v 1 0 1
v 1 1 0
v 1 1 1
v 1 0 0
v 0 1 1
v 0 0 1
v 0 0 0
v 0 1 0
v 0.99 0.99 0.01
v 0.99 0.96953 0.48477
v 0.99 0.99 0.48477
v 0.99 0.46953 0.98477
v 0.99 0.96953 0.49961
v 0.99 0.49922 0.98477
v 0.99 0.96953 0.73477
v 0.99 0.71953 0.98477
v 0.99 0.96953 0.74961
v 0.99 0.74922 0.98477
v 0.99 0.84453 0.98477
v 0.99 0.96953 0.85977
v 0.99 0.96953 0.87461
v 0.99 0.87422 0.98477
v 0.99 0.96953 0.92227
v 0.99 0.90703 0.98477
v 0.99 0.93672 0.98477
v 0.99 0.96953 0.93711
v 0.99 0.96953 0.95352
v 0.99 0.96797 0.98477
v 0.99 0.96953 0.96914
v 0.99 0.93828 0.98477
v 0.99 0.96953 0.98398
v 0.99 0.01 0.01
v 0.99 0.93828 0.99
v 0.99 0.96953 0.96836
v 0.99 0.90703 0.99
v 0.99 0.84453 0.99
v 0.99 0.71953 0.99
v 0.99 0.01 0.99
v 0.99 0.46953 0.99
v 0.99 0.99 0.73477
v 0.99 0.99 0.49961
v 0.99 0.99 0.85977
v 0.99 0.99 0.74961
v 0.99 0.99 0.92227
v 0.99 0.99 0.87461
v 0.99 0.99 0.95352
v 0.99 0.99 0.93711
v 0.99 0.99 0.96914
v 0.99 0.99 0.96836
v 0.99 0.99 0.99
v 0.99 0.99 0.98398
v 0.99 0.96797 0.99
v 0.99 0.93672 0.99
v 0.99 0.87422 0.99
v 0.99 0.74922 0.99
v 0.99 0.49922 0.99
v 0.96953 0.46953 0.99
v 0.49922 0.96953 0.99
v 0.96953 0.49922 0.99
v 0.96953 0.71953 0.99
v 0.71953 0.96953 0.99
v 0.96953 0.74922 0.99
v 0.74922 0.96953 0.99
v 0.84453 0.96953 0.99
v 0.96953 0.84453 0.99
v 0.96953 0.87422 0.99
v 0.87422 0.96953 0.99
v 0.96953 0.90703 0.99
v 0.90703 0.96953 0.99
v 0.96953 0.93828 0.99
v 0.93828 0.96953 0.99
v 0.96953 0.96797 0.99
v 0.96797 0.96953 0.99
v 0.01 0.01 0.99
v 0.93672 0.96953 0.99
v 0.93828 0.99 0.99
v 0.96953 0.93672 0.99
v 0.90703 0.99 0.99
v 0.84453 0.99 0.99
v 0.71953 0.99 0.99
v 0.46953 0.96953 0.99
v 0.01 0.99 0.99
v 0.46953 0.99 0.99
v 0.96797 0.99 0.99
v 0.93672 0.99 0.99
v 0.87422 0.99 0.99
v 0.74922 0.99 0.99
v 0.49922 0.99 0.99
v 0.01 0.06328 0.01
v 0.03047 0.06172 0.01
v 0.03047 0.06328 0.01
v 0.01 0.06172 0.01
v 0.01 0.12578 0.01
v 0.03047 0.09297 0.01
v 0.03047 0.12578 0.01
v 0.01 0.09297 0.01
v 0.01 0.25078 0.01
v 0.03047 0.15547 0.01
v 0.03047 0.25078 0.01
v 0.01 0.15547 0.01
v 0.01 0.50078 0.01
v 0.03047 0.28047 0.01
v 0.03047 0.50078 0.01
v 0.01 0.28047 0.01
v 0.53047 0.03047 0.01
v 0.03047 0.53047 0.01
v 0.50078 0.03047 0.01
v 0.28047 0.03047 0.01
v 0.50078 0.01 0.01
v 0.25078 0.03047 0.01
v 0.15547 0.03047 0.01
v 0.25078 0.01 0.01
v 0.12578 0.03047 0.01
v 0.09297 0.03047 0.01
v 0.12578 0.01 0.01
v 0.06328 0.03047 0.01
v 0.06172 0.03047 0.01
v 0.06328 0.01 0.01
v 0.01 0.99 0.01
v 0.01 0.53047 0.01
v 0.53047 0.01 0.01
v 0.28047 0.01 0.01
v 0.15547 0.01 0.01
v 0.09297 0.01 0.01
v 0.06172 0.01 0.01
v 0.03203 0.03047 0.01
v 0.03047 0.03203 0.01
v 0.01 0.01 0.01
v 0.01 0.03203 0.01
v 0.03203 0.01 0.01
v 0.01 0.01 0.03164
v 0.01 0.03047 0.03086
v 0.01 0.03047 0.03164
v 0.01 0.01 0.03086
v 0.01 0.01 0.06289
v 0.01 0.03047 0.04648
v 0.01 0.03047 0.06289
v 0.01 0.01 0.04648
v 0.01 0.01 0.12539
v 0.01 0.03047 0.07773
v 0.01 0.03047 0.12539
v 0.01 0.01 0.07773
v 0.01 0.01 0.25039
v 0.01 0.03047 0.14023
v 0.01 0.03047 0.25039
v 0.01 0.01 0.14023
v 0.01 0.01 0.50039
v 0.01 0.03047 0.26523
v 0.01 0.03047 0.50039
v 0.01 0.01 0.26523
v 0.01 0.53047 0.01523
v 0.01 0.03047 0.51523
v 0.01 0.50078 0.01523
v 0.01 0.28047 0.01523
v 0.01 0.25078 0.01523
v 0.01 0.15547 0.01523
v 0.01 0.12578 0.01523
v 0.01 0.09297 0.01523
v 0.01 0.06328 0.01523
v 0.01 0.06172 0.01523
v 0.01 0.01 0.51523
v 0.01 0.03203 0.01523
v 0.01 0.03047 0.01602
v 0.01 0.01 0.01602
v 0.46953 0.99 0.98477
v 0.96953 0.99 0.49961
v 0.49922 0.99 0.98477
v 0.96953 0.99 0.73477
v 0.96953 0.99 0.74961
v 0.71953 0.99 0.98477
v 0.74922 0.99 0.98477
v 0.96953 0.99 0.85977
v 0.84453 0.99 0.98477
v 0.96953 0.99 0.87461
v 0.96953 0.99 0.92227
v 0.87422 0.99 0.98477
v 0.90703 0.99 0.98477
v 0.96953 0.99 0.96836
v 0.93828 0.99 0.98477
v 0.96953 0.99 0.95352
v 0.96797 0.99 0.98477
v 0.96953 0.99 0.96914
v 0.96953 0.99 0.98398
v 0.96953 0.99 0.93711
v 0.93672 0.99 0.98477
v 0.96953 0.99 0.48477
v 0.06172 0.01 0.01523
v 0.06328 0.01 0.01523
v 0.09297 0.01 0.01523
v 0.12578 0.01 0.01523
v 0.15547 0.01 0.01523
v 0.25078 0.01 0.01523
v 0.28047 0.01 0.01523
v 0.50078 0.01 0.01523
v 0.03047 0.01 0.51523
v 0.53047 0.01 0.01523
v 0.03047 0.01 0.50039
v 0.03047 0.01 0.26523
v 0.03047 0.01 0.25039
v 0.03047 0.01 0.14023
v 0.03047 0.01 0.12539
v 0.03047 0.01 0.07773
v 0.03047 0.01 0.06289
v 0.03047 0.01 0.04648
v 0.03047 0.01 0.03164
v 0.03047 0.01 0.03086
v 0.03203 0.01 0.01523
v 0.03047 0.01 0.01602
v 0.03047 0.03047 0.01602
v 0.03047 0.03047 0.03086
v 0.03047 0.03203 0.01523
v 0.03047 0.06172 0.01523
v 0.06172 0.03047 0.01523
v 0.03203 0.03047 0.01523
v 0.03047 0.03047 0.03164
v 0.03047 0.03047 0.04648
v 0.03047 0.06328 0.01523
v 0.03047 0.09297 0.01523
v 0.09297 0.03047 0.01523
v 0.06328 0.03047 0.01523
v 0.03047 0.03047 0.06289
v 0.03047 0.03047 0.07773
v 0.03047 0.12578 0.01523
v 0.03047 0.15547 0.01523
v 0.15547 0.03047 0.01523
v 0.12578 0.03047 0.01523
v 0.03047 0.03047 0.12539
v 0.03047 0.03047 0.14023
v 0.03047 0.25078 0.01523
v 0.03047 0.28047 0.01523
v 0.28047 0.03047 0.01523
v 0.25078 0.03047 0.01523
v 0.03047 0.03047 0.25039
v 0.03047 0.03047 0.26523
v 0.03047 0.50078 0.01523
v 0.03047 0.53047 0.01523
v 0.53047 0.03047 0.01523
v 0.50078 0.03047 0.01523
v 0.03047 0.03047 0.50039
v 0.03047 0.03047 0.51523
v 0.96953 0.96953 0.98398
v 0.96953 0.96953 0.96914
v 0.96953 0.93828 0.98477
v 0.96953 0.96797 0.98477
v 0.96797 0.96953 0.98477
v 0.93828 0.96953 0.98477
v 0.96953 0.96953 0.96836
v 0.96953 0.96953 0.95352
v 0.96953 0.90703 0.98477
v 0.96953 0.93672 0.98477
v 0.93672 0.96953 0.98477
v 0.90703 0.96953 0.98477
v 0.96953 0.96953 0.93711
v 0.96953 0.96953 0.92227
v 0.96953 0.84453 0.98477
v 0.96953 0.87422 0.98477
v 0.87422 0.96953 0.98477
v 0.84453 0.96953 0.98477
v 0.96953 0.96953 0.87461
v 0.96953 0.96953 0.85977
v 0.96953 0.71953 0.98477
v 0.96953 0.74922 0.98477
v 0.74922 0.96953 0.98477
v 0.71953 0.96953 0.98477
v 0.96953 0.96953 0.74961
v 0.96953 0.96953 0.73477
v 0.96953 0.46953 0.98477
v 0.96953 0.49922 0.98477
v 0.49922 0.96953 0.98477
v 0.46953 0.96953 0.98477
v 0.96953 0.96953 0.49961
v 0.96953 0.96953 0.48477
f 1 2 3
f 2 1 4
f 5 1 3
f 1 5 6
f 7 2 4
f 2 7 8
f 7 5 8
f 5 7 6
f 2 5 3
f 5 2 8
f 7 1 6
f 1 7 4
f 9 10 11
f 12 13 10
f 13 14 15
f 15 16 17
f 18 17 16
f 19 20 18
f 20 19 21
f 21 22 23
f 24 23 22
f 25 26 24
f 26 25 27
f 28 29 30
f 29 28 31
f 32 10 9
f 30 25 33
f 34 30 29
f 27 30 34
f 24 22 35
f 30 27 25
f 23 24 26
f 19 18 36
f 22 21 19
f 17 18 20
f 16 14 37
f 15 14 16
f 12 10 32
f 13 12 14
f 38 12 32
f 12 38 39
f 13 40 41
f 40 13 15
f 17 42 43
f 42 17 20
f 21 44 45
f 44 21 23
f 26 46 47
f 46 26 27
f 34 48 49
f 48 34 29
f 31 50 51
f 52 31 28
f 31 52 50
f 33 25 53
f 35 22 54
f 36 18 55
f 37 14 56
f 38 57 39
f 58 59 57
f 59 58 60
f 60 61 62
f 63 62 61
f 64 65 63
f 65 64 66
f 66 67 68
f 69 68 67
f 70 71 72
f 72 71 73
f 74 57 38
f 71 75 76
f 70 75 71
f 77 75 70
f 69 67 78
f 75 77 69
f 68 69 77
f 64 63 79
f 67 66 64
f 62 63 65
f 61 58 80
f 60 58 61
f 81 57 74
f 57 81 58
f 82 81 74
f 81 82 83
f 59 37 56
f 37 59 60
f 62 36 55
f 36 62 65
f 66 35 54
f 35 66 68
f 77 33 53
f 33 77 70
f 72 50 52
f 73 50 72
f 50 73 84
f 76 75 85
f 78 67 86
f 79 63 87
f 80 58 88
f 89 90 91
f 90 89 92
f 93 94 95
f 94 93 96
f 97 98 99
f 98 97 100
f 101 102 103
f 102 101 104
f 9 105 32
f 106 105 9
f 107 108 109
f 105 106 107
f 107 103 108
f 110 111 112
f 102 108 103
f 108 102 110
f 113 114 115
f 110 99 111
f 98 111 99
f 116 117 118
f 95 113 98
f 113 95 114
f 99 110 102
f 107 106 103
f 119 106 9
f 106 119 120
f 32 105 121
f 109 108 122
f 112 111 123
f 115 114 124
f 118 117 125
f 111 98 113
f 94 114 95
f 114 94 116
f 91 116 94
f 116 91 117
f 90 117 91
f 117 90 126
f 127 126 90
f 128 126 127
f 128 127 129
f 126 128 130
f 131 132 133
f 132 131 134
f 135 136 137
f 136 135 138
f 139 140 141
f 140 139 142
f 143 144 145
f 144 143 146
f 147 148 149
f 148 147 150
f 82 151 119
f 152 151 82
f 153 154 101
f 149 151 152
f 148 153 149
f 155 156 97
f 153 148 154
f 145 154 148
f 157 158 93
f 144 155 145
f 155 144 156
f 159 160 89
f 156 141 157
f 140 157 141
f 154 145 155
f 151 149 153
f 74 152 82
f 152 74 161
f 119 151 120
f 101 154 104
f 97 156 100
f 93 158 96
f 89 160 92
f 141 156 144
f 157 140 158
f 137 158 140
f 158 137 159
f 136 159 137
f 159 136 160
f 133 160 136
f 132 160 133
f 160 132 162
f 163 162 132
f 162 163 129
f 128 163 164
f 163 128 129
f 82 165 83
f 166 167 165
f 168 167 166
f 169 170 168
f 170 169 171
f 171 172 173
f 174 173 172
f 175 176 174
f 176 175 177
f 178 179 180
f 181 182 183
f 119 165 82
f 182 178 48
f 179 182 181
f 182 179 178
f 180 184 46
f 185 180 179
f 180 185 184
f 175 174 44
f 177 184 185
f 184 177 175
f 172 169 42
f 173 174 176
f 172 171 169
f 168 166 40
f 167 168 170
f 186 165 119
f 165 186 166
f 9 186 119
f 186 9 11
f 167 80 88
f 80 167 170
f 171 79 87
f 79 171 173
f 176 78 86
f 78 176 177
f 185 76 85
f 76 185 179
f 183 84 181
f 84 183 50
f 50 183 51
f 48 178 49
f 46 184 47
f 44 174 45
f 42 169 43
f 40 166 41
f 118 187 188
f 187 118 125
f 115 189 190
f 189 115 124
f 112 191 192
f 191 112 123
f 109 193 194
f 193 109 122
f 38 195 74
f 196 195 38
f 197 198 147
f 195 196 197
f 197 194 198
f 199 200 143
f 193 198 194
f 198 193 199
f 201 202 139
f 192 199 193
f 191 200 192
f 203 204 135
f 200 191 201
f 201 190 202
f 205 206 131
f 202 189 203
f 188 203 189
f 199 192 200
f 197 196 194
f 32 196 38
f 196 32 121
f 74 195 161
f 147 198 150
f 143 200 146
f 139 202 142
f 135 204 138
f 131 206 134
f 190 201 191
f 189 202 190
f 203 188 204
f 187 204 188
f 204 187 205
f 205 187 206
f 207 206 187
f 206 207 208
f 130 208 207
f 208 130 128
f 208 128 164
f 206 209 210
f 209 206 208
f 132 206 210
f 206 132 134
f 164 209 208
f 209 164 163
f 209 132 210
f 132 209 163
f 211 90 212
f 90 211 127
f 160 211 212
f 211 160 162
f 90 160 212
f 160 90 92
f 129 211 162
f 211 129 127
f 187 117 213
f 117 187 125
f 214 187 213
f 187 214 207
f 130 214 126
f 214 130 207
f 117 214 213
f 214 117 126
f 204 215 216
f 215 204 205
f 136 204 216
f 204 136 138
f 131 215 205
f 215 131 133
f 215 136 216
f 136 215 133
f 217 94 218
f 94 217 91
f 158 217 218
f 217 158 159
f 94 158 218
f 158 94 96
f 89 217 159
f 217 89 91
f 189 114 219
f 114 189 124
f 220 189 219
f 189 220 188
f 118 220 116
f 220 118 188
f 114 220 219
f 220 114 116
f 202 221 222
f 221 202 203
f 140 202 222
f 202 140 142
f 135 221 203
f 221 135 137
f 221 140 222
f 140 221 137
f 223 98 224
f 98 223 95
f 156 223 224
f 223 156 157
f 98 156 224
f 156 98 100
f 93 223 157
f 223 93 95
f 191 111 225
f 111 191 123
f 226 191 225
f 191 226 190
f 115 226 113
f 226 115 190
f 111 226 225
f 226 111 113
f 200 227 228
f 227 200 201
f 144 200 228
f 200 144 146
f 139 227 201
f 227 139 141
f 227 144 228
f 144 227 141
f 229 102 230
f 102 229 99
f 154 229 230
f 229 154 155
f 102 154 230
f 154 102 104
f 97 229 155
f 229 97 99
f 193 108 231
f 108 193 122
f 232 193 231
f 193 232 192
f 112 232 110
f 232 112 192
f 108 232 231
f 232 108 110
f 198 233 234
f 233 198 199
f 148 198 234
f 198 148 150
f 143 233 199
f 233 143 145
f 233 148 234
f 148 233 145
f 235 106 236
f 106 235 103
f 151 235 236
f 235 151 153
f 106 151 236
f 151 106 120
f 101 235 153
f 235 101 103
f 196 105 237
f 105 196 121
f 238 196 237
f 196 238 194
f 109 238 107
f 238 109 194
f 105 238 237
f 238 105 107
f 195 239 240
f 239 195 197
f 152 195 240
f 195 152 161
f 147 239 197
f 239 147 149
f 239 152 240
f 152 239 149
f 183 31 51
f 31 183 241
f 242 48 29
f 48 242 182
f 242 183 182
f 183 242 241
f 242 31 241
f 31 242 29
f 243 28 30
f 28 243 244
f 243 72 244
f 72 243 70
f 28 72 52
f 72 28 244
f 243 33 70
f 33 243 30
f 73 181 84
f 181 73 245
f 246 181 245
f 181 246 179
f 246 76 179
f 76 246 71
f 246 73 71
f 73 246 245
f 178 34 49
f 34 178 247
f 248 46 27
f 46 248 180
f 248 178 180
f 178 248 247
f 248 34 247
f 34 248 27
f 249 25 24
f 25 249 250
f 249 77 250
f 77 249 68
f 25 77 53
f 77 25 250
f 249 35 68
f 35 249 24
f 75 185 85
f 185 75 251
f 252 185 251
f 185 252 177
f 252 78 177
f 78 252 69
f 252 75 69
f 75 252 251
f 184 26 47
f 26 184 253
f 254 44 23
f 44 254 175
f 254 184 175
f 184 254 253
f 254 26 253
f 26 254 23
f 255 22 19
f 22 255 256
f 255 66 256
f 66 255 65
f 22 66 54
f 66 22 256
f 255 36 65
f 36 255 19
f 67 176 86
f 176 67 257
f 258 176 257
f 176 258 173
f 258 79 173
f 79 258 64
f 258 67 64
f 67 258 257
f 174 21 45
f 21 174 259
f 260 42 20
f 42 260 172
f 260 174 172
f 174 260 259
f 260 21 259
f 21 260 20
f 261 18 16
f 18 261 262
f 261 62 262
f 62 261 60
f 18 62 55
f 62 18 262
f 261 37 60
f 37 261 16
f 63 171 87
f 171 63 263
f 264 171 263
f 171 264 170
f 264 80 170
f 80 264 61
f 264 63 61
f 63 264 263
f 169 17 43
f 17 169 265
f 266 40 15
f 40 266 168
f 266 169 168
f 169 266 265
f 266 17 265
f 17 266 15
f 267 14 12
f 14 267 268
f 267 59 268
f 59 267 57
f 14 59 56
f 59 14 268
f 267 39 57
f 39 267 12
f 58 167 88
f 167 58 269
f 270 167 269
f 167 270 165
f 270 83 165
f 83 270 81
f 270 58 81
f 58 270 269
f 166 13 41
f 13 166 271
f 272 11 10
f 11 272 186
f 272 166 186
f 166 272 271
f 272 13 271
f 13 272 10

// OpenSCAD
translate([0.015625, 0.015625, 0.0234375]) color([0.3772993434878168, 0.1649863920768314, 0.49174047771116636]) cube([0.0296875, 0.0296875, 0.01484375], center=true);
translate([0.015625, 0.046875, 0.0078125]) color([0.8253149071088011, 0.7450367643088419, 0.7013611365158168]) cube([0.0296875, 0.0296875, 0.01484375], center=true);
translate([0.046875, 0.015625, 0.0078125]) color([0.034272548668239144, 0.563042147429633, 0.08522890246689274]) cube([0.0296875, 0.0296875, 0.01484375], center=true);
translate([0.015625, 0.015625, 0.0390625]) color([0.11253595017285833, 0.01093416965271432, 0.9823642421468226]) cube([0.0296875, 0.0296875, 0.01484375], center=true);
translate([0.015625, 0.078125, 0.0078125]) color([0.7059261585673936, 0.09282021777939053, 0.4845607045867538]) cube([0.0296875, 0.0296875, 0.01484375], center=true);
translate([0.078125, 0.015625, 0.0078125]) color([0.1898150632596345, 0.8487694551210829, 0.2483530397387106]) cube([0.0296875, 0.0296875, 0.01484375], center=true);
translate([0.015625, 0.015625, 0.0703125]) color([0.7278960118052508, 0.3683906268527424, 0.7120965883019642]) cube([0.0296875, 0.0296875, 0.01484375], center=true);
translate([0.015625, 0.140625, 0.0078125]) color([0.31564489188558287, 0.7343941606091648, 0.32252145504187457]) cube([0.0296875, 0.0296875, 0.01484375], center=true);
translate([0.140625, 0.015625, 0.0078125]) color([0.7746008073133395, 0.9083681938404289, 0.3114031409993785]) cube([0.0296875, 0.0296875, 0.01484375], center=true);
translate([0.015625, 0.015625, 0.1328125]) color([0.8691841530734682, 0.07626088303816692, 0.9924146076227822]) cube([0.0296875, 0.0296875, 0.01484375], center=true);
translate([0.015625, 0.265625, 0.0078125]) color([0.3658335875324925, 0.959418647071259, 0.46880429942758417]) cube([0.0296875, 0.0296875, 0.01484375], center=true);
translate([0.265625, 0.015625, 0.0078125]) color([0.9457710975667576, 0.6818701848079768, 0.3962830763001103]) cube([0.0296875, 0.0296875, 0.01484375], center=true);
translate([0.015625, 0.015625, 0.2578125]) color([0.47328096740506664, 0.9125589222950233, 0.2448765809510478]) cube([0.0296875, 0.0296875, 0.01484375], center=true);
translate([0.015625, 0.515625, 0.0078125]) color([0.43711437902480443, 0.45777840886052856, 0.07013663668460868]) cube([0.0296875, 0.0296875, 0.01484375], center=true);
translate([0.515625, 0.015625, 0.0078125]) color([0.9120912577953124, 0.3005519498717373, 0.2340404926883537]) cube([0.0296875, 0.0296875, 0.01484375], center=true);
translate([0.015625, 0.015625, 0.5078125]) color([0.7848225903832207, 0.6518143562572739, 0.787883061543982]) cube([0.0296875, 0.0296875, 0.01484375], center=true);
translate([0.984375, 0.984375, 0.9765625]) color([0.4035743012985704, 0.016619850467338493, 0.3115742726523294]) cube([0.0296875, 0.0296875, 0.01484375], center=true);
translate([0.984375, 0.953125, 0.9921875]) color([0.705956725639164, 0.8273626658601455, 0.3352210218461187]) cube([0.0296875, 0.0296875, 0.01484375], center=true);
translate([0.953125, 0.984375, 0.9921875]) color([0.12267160355132534, 0.2715335749023635, 0.013451295074906722]) cube([0.0296875, 0.0296875, 0.01484375], center=true);
translate([0.984375, 0.984375, 0.9609375]) color([0.03569561325804793, 0.5520454444124445, 0.3480814240891923]) cube([0.0296875, 0.0296875, 0.01484375], center=true);
translate([0.984375, 0.921875, 0.9921875]) color([0.5130568258888191, 0.7334599854718197, 0.6745762818978787]) cube([0.0296875, 0.0296875, 0.01484375], center=true);
translate([0.921875, 0.984375, 0.9921875]) color([0.9543001423247574, 0.3476697165850029, 0.9342643158830519]) cube([0.0296875, 0.0296875, 0.01484375], center=true);
translate([0.984375, 0.984375, 0.9296875]) color([0.6280054858550289, 0.3457812342914064, 0.9319636111267731]) cube([0.0296875, 0.0296875, 0.01484375], center=true);
translate([0.984375, 0.859375, 0.9921875]) color([0.10350290752884284, 0.5667615678172512, 0.4153265416672617]) cube([0.0296875, 0.0296875, 0.01484375], center=true);
translate([0.859375, 0.984375, 0.9921875]) color([0.11230524262850528, 0.12021860559091524, 0.505296193147532]) cube([0.0296875, 0.0296875, 0.01484375], center=true);
translate([0.984375, 0.984375, 0.8671875]) color([0.582978555055975, 0.3309012669200073, 0.17237204255433092]) cube([0.0296875, 0.0296875, 0.01484375], center=true);
translate([0.984375, 0.734375, 0.9921875]) color([0.24337403252770995, 0.25576986122839074, 0.1924388803855701]) cube([0.0296875, 0.0296875, 0.01484375], center=true);
translate([0.734375, 0.984375, 0.9921875]) color([0.10009206980602914, 0.6883094467770534, 0.7779859751122933]) cube([0.0296875, 0.0296875, 0.01484375], center=true);
translate([0.984375, 0.984375, 0.7421875]) color([0.7771995478789664, 0.9485047226871023, 0.2382464106765314]) cube([0.0296875, 0.0296875, 0.01484375], center=true);
translate([0.984375, 0.484375, 0.9921875]) color([0.7345243989679724, 0.6780496444835071, 0.0066441559110989035]) cube([0.0296875, 0.0296875, 0.01484375], center=true);
translate([0.484375, 0.984375, 0.9921875]) color([0.16532146672181924, 0.5050274548624961, 0.45188519160468166]) cube([0.0296875, 0.0296875, 0.01484375], center=true);
translate([0.984375, 0.984375, 0.4921875]) color([0.2935212233937141, 0.6964886629131406, 0.5676776405772807]) cube([0.0296875, 0.0296875, 0.01484375], center=true);
color([0.3,0.3,0.3,0.3]) difference() { cube([1,1,1]); translate([0.01,0.01,0.01]) cube([0.98,0.98,0.98]); }
